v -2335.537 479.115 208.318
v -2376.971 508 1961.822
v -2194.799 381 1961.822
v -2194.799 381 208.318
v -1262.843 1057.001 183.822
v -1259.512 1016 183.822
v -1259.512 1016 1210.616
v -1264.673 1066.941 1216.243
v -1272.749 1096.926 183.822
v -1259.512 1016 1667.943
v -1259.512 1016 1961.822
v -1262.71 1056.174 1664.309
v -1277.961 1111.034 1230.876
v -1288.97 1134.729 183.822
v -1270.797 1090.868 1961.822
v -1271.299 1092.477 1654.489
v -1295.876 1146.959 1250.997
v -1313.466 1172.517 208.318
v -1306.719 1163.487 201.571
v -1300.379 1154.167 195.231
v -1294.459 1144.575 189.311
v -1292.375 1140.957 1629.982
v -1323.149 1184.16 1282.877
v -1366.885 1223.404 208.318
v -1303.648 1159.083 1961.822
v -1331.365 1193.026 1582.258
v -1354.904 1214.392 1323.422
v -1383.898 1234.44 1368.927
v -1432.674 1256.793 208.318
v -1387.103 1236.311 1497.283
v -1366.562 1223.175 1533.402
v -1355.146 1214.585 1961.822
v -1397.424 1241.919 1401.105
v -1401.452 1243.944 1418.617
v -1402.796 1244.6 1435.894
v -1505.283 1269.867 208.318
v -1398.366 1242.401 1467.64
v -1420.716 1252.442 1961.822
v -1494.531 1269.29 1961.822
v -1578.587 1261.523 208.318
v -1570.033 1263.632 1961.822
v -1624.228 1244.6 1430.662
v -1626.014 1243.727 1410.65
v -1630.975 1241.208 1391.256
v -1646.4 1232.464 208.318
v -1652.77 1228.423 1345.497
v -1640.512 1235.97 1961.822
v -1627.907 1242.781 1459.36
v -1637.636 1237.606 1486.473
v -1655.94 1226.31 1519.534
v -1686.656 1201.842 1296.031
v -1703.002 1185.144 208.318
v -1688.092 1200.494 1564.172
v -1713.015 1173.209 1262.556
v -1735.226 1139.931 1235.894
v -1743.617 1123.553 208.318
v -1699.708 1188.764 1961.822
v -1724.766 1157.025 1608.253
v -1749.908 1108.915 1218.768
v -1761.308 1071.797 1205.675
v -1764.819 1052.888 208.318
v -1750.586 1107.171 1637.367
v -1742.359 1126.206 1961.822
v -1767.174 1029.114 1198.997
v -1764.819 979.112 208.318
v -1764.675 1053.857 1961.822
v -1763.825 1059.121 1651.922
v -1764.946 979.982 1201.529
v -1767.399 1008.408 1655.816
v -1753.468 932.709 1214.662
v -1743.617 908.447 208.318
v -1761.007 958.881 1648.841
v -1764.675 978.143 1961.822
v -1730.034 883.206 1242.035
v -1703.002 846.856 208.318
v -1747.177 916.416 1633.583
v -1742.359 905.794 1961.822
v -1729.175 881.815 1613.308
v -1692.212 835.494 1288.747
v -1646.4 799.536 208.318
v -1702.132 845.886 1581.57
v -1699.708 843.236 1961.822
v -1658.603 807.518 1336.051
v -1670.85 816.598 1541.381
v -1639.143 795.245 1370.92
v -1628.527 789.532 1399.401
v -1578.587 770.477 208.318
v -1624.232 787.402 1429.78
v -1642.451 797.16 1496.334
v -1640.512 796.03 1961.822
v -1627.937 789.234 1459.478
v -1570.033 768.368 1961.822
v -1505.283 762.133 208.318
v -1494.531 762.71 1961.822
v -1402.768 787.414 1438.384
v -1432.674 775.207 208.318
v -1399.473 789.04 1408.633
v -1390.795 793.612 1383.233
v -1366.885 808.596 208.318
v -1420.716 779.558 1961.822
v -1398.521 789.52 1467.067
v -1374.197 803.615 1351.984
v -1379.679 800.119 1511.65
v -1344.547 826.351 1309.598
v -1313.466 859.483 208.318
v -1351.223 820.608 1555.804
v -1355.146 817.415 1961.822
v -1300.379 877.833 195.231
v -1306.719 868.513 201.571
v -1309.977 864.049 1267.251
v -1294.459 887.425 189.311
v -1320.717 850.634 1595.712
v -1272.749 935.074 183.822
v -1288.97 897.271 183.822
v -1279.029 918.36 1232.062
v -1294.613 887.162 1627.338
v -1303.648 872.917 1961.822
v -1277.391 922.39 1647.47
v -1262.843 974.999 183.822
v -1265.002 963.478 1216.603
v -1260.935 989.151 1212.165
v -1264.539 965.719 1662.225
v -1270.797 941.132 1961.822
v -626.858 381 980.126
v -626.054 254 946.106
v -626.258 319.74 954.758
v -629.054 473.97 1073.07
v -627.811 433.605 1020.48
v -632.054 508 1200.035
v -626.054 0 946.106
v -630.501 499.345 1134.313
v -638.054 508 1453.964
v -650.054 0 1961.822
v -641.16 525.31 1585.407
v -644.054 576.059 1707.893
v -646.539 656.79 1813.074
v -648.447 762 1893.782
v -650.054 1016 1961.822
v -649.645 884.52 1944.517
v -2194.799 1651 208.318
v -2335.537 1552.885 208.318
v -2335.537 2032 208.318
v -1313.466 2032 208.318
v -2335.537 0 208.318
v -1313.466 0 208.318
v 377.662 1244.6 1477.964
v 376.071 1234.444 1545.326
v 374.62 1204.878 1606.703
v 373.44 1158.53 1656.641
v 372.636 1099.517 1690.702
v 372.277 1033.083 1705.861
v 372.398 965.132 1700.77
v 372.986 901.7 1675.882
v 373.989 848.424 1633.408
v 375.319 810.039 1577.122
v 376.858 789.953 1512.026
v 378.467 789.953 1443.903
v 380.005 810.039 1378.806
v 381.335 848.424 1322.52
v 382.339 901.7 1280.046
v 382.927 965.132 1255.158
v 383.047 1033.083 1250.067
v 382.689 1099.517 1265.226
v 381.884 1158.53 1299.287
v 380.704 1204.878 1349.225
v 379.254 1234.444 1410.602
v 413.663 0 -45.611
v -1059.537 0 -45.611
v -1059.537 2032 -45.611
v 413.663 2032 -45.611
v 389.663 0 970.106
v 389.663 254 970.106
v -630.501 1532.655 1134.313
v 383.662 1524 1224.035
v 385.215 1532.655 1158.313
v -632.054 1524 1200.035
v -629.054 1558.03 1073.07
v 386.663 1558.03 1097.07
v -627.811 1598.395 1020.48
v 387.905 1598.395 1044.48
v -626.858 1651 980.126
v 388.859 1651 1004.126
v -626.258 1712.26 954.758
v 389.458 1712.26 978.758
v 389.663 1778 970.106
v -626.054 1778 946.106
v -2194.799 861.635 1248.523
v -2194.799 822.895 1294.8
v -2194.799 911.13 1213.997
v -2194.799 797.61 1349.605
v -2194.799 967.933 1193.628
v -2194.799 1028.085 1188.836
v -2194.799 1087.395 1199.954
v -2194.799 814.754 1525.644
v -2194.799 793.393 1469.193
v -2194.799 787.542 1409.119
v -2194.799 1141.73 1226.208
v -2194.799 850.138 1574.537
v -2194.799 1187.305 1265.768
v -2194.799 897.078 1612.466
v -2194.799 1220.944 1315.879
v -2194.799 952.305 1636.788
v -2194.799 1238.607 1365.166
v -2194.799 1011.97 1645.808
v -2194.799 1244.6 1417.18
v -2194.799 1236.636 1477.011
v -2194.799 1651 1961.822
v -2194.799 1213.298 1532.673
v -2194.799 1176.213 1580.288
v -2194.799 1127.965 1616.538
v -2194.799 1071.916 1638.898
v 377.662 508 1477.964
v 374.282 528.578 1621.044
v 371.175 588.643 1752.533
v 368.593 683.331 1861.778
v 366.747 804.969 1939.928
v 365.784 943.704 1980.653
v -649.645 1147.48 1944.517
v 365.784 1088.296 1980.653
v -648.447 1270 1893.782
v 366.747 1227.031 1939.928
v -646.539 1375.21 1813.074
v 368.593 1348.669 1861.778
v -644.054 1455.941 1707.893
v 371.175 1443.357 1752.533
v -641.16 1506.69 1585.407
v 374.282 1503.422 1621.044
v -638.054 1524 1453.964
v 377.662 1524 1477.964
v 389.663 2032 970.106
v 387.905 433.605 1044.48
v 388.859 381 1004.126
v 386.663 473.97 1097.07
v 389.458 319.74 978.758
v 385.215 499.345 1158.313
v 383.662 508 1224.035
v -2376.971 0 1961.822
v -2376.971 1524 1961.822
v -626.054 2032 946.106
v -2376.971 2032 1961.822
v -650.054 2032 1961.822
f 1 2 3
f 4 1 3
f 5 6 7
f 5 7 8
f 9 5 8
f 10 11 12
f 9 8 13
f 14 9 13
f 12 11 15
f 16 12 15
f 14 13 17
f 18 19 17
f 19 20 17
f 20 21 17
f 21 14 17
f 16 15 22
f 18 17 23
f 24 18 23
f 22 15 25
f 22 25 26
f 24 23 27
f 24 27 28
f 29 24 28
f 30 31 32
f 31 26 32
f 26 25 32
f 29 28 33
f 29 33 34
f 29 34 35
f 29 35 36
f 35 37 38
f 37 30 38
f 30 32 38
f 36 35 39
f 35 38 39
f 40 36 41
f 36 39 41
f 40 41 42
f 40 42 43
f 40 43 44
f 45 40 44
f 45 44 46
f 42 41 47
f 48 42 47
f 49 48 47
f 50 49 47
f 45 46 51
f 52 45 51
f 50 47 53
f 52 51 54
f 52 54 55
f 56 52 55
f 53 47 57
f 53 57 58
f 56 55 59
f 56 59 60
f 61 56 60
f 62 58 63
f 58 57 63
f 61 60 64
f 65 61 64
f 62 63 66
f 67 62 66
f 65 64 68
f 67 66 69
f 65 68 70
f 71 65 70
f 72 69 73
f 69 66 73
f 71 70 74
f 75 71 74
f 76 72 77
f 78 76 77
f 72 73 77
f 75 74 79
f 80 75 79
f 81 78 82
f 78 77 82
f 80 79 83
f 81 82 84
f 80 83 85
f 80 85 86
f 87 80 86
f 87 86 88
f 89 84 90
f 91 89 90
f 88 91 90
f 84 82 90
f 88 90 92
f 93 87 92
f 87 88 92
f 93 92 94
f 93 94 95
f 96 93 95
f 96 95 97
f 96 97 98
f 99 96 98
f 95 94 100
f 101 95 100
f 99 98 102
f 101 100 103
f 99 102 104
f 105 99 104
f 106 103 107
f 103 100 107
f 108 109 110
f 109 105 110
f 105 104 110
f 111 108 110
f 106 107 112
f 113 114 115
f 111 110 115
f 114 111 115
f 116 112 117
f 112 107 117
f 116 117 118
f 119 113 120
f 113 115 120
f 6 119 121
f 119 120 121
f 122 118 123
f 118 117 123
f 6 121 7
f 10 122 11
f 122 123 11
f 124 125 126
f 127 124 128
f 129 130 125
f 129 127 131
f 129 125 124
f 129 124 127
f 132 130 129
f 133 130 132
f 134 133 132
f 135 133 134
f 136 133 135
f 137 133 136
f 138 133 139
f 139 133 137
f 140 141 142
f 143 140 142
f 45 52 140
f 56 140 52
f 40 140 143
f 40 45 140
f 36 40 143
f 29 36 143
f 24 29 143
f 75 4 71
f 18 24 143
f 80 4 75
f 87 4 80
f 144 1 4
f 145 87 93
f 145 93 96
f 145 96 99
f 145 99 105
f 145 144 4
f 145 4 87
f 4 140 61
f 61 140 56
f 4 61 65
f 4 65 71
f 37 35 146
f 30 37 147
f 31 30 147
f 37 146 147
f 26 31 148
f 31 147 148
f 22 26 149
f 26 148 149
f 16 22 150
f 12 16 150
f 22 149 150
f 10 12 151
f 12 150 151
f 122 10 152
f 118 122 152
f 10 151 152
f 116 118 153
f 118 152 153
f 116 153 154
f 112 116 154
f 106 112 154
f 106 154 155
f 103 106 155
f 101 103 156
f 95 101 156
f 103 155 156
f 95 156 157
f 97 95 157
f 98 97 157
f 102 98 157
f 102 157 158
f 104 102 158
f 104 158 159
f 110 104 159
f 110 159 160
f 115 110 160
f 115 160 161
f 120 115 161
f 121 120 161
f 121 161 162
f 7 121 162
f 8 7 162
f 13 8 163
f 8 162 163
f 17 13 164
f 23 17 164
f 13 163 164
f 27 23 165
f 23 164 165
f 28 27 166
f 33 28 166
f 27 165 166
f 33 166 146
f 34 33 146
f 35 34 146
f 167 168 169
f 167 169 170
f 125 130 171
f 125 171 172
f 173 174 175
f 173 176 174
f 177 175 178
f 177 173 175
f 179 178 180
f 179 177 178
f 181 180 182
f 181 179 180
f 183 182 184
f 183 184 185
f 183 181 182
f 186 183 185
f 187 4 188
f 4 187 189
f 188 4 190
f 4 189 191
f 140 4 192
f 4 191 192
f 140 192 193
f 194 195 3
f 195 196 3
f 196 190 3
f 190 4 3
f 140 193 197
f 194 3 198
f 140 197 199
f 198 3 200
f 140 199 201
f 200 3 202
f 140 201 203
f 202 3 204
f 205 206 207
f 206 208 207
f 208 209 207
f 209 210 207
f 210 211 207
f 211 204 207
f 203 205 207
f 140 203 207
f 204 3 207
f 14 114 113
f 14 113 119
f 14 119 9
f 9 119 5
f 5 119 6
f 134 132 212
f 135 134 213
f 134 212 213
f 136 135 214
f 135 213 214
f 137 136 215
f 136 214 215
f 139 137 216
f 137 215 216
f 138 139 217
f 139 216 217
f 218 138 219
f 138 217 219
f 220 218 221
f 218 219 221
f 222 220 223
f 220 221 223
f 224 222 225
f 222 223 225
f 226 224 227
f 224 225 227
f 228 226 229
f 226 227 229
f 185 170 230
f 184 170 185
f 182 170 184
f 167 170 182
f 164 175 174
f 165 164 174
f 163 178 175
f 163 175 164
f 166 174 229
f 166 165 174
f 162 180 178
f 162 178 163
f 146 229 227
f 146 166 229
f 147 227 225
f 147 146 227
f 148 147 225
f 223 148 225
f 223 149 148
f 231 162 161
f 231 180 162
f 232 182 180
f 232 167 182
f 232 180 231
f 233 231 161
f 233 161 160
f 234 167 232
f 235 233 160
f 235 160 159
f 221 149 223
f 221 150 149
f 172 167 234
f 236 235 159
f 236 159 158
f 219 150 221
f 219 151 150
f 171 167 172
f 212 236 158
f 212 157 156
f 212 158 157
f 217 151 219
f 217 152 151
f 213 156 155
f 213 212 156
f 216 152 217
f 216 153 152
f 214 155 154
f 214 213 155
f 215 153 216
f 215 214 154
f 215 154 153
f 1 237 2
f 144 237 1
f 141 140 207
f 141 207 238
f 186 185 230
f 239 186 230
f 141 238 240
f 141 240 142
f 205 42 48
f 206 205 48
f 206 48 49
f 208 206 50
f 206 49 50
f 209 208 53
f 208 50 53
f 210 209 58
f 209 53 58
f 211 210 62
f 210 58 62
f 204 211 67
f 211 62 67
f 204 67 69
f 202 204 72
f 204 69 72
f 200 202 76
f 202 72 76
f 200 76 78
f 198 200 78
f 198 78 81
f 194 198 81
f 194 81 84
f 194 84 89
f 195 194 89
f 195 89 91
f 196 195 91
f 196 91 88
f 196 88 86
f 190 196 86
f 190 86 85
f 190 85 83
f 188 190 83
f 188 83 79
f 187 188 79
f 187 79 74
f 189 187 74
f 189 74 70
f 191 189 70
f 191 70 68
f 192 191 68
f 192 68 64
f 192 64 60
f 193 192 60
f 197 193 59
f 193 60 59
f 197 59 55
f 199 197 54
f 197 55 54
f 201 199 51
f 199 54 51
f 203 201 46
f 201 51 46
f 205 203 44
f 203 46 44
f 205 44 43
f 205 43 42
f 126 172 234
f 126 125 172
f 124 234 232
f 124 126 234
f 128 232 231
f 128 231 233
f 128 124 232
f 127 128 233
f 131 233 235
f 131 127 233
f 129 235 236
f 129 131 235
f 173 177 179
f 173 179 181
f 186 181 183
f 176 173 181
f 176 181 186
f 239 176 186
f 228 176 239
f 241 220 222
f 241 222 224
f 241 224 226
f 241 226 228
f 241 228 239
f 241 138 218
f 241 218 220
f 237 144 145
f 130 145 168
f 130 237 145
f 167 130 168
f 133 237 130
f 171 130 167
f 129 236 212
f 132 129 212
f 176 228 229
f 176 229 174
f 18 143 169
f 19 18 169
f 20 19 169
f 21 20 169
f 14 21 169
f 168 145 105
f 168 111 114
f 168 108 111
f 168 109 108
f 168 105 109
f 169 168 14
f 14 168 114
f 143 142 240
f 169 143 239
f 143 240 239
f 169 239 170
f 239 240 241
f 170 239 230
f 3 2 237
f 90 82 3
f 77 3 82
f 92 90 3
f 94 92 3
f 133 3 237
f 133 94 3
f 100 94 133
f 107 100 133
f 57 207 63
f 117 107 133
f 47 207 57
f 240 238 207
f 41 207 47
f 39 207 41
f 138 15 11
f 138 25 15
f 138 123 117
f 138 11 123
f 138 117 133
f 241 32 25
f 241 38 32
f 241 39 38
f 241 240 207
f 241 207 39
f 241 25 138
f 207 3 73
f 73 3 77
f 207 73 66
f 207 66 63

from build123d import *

# Parameters (mm, degrees)
F1_DEPTH   = 2032
F1_FACE1_W = 2743.2
F1_FACE1_H = 2032
F3_DEPTH   = 1016
F4_R       = 254
F5_R       = 254
F6_R       = 228.6
F7_DEPTH   = 2743.2
F8_R       = 254
F9_DEPTH   = 1778
F10_DEPTH  = 1778
F12_DEPTH  = 1778


with BuildPart() as f1:
    # F0 (on Front) → F1 (new body)
    with BuildSketch(Plane.XZ):
        Polygon((-1313.466297527, 208.3184523385), (-1059.5371751883, -45.6106700003), (413.6628248117, -45.6106700003), (365.662272644, 1985.8223087099), (-2377.537727356, 1985.8223087099), (-2335.5372442092, 208.3184523385), align=None)
    extrude(amount=-F1_DEPTH)

    # F2 (on face) + F1_face1 (on face) → F3 (cut)
    with BuildSketch(Plane(origin=(412.35486604, 0, 9.7434970616), x_dir=(0, 1, 0), z_dir=(0.9997209541, 0, 0.023622319))):
        with BuildLine():
            ThreePointArc((508, 1468.6303822727), (656.7897551572, 1827.8406271154), (1016, 1976.6303822727))
            Line((1016, 1976.6303822727), (0, 1976.6303822727))
            Line((0, 1976.6303822727), (0, 960.6303822727))
            Line((0, 960.6303822727), (508, 960.6303822727))
            Line((508, 960.6303822727), (508, 1468.6303822727))
        make_face()
        with BuildLine():
            ThreePointArc((1016, 1976.6303822727), (1375.2102448428, 1827.8406271154), (1524, 1468.6303822727))
            Line((1524, 1468.6303822727), (1524, 960.6303822727))
            Line((1524, 960.6303822727), (2032, 960.6303822727))
            Line((2032, 960.6303822727), (2032, 1976.6303822727))
            Line((2032, 1976.6303822727), (1016, 1976.6303822727))
        make_face()
    with BuildSketch(Plane(origin=(-1005.937727356, 1016, 1985.8223087099), x_dir=(1, 0, 0), z_dir=(0, 0, 1))):
        Rectangle(F1_FACE1_W, F1_FACE1_H)
    extrude(amount=-F3_DEPTH, dir=(0.9997209541, 0, 0.023622319), mode=Mode.SUBTRACT)

    # F4
    f4_edges = [f1.edges().sort_by_distance(p)[0] for p in [
        (-118.195696, 508, 958.105681),
    ]]
    fillet(f4_edges, radius=F4_R)

    # F5
    f5_edges = [f1.edges().sort_by_distance(p)[0] for p in [
        (-118.195696, 1524, 958.105681),
    ]]
    fillet(f5_edges, radius=F5_R)

    # F6 (on face) → F7 (cut)
    with BuildSketch(Plane(origin=(412.35486604, 0, 9.7434970616), x_dir=(0, 1, 0), z_dir=(0.9997209541, 0, 0.023622319))):
        with Locations((1016, 1468.6303822727)):
            Circle(F6_R)
    extrude(amount=-F7_DEPTH, mode=Mode.SUBTRACT)

    # F8 (on face) → F9 (cut)
    with BuildSketch(Plane.XY.offset(1961.8220326261)):
        with Locations((-1513.5124218214, 1016)):
            Circle(F8_R)
    extrude(amount=-F9_DEPTH, mode=Mode.SUBTRACT)

    # F8 (on face) → F10 (cut)
    with BuildSketch(Plane.XY.offset(1961.8220326261)):
        with Locations((-1513.5124218214, 1016)):
            Circle(F8_R)
    extrude(amount=-F10_DEPTH, mode=Mode.SUBTRACT)

    # F11 (on face) → F12 (cut)
    with BuildSketch(Plane.XY.offset(1961.8220326261)):
        Polygon((-2194.798707962, 381), (-2194.798707962, 1016), (-2194.798707962, 1651), (-2376.9706269316, 1524), (-2376.9706269316, 1016), (-2376.9706269316, 508), align=None)
    extrude(amount=-F12_DEPTH, mode=Mode.SUBTRACT)


solid = f1.part
